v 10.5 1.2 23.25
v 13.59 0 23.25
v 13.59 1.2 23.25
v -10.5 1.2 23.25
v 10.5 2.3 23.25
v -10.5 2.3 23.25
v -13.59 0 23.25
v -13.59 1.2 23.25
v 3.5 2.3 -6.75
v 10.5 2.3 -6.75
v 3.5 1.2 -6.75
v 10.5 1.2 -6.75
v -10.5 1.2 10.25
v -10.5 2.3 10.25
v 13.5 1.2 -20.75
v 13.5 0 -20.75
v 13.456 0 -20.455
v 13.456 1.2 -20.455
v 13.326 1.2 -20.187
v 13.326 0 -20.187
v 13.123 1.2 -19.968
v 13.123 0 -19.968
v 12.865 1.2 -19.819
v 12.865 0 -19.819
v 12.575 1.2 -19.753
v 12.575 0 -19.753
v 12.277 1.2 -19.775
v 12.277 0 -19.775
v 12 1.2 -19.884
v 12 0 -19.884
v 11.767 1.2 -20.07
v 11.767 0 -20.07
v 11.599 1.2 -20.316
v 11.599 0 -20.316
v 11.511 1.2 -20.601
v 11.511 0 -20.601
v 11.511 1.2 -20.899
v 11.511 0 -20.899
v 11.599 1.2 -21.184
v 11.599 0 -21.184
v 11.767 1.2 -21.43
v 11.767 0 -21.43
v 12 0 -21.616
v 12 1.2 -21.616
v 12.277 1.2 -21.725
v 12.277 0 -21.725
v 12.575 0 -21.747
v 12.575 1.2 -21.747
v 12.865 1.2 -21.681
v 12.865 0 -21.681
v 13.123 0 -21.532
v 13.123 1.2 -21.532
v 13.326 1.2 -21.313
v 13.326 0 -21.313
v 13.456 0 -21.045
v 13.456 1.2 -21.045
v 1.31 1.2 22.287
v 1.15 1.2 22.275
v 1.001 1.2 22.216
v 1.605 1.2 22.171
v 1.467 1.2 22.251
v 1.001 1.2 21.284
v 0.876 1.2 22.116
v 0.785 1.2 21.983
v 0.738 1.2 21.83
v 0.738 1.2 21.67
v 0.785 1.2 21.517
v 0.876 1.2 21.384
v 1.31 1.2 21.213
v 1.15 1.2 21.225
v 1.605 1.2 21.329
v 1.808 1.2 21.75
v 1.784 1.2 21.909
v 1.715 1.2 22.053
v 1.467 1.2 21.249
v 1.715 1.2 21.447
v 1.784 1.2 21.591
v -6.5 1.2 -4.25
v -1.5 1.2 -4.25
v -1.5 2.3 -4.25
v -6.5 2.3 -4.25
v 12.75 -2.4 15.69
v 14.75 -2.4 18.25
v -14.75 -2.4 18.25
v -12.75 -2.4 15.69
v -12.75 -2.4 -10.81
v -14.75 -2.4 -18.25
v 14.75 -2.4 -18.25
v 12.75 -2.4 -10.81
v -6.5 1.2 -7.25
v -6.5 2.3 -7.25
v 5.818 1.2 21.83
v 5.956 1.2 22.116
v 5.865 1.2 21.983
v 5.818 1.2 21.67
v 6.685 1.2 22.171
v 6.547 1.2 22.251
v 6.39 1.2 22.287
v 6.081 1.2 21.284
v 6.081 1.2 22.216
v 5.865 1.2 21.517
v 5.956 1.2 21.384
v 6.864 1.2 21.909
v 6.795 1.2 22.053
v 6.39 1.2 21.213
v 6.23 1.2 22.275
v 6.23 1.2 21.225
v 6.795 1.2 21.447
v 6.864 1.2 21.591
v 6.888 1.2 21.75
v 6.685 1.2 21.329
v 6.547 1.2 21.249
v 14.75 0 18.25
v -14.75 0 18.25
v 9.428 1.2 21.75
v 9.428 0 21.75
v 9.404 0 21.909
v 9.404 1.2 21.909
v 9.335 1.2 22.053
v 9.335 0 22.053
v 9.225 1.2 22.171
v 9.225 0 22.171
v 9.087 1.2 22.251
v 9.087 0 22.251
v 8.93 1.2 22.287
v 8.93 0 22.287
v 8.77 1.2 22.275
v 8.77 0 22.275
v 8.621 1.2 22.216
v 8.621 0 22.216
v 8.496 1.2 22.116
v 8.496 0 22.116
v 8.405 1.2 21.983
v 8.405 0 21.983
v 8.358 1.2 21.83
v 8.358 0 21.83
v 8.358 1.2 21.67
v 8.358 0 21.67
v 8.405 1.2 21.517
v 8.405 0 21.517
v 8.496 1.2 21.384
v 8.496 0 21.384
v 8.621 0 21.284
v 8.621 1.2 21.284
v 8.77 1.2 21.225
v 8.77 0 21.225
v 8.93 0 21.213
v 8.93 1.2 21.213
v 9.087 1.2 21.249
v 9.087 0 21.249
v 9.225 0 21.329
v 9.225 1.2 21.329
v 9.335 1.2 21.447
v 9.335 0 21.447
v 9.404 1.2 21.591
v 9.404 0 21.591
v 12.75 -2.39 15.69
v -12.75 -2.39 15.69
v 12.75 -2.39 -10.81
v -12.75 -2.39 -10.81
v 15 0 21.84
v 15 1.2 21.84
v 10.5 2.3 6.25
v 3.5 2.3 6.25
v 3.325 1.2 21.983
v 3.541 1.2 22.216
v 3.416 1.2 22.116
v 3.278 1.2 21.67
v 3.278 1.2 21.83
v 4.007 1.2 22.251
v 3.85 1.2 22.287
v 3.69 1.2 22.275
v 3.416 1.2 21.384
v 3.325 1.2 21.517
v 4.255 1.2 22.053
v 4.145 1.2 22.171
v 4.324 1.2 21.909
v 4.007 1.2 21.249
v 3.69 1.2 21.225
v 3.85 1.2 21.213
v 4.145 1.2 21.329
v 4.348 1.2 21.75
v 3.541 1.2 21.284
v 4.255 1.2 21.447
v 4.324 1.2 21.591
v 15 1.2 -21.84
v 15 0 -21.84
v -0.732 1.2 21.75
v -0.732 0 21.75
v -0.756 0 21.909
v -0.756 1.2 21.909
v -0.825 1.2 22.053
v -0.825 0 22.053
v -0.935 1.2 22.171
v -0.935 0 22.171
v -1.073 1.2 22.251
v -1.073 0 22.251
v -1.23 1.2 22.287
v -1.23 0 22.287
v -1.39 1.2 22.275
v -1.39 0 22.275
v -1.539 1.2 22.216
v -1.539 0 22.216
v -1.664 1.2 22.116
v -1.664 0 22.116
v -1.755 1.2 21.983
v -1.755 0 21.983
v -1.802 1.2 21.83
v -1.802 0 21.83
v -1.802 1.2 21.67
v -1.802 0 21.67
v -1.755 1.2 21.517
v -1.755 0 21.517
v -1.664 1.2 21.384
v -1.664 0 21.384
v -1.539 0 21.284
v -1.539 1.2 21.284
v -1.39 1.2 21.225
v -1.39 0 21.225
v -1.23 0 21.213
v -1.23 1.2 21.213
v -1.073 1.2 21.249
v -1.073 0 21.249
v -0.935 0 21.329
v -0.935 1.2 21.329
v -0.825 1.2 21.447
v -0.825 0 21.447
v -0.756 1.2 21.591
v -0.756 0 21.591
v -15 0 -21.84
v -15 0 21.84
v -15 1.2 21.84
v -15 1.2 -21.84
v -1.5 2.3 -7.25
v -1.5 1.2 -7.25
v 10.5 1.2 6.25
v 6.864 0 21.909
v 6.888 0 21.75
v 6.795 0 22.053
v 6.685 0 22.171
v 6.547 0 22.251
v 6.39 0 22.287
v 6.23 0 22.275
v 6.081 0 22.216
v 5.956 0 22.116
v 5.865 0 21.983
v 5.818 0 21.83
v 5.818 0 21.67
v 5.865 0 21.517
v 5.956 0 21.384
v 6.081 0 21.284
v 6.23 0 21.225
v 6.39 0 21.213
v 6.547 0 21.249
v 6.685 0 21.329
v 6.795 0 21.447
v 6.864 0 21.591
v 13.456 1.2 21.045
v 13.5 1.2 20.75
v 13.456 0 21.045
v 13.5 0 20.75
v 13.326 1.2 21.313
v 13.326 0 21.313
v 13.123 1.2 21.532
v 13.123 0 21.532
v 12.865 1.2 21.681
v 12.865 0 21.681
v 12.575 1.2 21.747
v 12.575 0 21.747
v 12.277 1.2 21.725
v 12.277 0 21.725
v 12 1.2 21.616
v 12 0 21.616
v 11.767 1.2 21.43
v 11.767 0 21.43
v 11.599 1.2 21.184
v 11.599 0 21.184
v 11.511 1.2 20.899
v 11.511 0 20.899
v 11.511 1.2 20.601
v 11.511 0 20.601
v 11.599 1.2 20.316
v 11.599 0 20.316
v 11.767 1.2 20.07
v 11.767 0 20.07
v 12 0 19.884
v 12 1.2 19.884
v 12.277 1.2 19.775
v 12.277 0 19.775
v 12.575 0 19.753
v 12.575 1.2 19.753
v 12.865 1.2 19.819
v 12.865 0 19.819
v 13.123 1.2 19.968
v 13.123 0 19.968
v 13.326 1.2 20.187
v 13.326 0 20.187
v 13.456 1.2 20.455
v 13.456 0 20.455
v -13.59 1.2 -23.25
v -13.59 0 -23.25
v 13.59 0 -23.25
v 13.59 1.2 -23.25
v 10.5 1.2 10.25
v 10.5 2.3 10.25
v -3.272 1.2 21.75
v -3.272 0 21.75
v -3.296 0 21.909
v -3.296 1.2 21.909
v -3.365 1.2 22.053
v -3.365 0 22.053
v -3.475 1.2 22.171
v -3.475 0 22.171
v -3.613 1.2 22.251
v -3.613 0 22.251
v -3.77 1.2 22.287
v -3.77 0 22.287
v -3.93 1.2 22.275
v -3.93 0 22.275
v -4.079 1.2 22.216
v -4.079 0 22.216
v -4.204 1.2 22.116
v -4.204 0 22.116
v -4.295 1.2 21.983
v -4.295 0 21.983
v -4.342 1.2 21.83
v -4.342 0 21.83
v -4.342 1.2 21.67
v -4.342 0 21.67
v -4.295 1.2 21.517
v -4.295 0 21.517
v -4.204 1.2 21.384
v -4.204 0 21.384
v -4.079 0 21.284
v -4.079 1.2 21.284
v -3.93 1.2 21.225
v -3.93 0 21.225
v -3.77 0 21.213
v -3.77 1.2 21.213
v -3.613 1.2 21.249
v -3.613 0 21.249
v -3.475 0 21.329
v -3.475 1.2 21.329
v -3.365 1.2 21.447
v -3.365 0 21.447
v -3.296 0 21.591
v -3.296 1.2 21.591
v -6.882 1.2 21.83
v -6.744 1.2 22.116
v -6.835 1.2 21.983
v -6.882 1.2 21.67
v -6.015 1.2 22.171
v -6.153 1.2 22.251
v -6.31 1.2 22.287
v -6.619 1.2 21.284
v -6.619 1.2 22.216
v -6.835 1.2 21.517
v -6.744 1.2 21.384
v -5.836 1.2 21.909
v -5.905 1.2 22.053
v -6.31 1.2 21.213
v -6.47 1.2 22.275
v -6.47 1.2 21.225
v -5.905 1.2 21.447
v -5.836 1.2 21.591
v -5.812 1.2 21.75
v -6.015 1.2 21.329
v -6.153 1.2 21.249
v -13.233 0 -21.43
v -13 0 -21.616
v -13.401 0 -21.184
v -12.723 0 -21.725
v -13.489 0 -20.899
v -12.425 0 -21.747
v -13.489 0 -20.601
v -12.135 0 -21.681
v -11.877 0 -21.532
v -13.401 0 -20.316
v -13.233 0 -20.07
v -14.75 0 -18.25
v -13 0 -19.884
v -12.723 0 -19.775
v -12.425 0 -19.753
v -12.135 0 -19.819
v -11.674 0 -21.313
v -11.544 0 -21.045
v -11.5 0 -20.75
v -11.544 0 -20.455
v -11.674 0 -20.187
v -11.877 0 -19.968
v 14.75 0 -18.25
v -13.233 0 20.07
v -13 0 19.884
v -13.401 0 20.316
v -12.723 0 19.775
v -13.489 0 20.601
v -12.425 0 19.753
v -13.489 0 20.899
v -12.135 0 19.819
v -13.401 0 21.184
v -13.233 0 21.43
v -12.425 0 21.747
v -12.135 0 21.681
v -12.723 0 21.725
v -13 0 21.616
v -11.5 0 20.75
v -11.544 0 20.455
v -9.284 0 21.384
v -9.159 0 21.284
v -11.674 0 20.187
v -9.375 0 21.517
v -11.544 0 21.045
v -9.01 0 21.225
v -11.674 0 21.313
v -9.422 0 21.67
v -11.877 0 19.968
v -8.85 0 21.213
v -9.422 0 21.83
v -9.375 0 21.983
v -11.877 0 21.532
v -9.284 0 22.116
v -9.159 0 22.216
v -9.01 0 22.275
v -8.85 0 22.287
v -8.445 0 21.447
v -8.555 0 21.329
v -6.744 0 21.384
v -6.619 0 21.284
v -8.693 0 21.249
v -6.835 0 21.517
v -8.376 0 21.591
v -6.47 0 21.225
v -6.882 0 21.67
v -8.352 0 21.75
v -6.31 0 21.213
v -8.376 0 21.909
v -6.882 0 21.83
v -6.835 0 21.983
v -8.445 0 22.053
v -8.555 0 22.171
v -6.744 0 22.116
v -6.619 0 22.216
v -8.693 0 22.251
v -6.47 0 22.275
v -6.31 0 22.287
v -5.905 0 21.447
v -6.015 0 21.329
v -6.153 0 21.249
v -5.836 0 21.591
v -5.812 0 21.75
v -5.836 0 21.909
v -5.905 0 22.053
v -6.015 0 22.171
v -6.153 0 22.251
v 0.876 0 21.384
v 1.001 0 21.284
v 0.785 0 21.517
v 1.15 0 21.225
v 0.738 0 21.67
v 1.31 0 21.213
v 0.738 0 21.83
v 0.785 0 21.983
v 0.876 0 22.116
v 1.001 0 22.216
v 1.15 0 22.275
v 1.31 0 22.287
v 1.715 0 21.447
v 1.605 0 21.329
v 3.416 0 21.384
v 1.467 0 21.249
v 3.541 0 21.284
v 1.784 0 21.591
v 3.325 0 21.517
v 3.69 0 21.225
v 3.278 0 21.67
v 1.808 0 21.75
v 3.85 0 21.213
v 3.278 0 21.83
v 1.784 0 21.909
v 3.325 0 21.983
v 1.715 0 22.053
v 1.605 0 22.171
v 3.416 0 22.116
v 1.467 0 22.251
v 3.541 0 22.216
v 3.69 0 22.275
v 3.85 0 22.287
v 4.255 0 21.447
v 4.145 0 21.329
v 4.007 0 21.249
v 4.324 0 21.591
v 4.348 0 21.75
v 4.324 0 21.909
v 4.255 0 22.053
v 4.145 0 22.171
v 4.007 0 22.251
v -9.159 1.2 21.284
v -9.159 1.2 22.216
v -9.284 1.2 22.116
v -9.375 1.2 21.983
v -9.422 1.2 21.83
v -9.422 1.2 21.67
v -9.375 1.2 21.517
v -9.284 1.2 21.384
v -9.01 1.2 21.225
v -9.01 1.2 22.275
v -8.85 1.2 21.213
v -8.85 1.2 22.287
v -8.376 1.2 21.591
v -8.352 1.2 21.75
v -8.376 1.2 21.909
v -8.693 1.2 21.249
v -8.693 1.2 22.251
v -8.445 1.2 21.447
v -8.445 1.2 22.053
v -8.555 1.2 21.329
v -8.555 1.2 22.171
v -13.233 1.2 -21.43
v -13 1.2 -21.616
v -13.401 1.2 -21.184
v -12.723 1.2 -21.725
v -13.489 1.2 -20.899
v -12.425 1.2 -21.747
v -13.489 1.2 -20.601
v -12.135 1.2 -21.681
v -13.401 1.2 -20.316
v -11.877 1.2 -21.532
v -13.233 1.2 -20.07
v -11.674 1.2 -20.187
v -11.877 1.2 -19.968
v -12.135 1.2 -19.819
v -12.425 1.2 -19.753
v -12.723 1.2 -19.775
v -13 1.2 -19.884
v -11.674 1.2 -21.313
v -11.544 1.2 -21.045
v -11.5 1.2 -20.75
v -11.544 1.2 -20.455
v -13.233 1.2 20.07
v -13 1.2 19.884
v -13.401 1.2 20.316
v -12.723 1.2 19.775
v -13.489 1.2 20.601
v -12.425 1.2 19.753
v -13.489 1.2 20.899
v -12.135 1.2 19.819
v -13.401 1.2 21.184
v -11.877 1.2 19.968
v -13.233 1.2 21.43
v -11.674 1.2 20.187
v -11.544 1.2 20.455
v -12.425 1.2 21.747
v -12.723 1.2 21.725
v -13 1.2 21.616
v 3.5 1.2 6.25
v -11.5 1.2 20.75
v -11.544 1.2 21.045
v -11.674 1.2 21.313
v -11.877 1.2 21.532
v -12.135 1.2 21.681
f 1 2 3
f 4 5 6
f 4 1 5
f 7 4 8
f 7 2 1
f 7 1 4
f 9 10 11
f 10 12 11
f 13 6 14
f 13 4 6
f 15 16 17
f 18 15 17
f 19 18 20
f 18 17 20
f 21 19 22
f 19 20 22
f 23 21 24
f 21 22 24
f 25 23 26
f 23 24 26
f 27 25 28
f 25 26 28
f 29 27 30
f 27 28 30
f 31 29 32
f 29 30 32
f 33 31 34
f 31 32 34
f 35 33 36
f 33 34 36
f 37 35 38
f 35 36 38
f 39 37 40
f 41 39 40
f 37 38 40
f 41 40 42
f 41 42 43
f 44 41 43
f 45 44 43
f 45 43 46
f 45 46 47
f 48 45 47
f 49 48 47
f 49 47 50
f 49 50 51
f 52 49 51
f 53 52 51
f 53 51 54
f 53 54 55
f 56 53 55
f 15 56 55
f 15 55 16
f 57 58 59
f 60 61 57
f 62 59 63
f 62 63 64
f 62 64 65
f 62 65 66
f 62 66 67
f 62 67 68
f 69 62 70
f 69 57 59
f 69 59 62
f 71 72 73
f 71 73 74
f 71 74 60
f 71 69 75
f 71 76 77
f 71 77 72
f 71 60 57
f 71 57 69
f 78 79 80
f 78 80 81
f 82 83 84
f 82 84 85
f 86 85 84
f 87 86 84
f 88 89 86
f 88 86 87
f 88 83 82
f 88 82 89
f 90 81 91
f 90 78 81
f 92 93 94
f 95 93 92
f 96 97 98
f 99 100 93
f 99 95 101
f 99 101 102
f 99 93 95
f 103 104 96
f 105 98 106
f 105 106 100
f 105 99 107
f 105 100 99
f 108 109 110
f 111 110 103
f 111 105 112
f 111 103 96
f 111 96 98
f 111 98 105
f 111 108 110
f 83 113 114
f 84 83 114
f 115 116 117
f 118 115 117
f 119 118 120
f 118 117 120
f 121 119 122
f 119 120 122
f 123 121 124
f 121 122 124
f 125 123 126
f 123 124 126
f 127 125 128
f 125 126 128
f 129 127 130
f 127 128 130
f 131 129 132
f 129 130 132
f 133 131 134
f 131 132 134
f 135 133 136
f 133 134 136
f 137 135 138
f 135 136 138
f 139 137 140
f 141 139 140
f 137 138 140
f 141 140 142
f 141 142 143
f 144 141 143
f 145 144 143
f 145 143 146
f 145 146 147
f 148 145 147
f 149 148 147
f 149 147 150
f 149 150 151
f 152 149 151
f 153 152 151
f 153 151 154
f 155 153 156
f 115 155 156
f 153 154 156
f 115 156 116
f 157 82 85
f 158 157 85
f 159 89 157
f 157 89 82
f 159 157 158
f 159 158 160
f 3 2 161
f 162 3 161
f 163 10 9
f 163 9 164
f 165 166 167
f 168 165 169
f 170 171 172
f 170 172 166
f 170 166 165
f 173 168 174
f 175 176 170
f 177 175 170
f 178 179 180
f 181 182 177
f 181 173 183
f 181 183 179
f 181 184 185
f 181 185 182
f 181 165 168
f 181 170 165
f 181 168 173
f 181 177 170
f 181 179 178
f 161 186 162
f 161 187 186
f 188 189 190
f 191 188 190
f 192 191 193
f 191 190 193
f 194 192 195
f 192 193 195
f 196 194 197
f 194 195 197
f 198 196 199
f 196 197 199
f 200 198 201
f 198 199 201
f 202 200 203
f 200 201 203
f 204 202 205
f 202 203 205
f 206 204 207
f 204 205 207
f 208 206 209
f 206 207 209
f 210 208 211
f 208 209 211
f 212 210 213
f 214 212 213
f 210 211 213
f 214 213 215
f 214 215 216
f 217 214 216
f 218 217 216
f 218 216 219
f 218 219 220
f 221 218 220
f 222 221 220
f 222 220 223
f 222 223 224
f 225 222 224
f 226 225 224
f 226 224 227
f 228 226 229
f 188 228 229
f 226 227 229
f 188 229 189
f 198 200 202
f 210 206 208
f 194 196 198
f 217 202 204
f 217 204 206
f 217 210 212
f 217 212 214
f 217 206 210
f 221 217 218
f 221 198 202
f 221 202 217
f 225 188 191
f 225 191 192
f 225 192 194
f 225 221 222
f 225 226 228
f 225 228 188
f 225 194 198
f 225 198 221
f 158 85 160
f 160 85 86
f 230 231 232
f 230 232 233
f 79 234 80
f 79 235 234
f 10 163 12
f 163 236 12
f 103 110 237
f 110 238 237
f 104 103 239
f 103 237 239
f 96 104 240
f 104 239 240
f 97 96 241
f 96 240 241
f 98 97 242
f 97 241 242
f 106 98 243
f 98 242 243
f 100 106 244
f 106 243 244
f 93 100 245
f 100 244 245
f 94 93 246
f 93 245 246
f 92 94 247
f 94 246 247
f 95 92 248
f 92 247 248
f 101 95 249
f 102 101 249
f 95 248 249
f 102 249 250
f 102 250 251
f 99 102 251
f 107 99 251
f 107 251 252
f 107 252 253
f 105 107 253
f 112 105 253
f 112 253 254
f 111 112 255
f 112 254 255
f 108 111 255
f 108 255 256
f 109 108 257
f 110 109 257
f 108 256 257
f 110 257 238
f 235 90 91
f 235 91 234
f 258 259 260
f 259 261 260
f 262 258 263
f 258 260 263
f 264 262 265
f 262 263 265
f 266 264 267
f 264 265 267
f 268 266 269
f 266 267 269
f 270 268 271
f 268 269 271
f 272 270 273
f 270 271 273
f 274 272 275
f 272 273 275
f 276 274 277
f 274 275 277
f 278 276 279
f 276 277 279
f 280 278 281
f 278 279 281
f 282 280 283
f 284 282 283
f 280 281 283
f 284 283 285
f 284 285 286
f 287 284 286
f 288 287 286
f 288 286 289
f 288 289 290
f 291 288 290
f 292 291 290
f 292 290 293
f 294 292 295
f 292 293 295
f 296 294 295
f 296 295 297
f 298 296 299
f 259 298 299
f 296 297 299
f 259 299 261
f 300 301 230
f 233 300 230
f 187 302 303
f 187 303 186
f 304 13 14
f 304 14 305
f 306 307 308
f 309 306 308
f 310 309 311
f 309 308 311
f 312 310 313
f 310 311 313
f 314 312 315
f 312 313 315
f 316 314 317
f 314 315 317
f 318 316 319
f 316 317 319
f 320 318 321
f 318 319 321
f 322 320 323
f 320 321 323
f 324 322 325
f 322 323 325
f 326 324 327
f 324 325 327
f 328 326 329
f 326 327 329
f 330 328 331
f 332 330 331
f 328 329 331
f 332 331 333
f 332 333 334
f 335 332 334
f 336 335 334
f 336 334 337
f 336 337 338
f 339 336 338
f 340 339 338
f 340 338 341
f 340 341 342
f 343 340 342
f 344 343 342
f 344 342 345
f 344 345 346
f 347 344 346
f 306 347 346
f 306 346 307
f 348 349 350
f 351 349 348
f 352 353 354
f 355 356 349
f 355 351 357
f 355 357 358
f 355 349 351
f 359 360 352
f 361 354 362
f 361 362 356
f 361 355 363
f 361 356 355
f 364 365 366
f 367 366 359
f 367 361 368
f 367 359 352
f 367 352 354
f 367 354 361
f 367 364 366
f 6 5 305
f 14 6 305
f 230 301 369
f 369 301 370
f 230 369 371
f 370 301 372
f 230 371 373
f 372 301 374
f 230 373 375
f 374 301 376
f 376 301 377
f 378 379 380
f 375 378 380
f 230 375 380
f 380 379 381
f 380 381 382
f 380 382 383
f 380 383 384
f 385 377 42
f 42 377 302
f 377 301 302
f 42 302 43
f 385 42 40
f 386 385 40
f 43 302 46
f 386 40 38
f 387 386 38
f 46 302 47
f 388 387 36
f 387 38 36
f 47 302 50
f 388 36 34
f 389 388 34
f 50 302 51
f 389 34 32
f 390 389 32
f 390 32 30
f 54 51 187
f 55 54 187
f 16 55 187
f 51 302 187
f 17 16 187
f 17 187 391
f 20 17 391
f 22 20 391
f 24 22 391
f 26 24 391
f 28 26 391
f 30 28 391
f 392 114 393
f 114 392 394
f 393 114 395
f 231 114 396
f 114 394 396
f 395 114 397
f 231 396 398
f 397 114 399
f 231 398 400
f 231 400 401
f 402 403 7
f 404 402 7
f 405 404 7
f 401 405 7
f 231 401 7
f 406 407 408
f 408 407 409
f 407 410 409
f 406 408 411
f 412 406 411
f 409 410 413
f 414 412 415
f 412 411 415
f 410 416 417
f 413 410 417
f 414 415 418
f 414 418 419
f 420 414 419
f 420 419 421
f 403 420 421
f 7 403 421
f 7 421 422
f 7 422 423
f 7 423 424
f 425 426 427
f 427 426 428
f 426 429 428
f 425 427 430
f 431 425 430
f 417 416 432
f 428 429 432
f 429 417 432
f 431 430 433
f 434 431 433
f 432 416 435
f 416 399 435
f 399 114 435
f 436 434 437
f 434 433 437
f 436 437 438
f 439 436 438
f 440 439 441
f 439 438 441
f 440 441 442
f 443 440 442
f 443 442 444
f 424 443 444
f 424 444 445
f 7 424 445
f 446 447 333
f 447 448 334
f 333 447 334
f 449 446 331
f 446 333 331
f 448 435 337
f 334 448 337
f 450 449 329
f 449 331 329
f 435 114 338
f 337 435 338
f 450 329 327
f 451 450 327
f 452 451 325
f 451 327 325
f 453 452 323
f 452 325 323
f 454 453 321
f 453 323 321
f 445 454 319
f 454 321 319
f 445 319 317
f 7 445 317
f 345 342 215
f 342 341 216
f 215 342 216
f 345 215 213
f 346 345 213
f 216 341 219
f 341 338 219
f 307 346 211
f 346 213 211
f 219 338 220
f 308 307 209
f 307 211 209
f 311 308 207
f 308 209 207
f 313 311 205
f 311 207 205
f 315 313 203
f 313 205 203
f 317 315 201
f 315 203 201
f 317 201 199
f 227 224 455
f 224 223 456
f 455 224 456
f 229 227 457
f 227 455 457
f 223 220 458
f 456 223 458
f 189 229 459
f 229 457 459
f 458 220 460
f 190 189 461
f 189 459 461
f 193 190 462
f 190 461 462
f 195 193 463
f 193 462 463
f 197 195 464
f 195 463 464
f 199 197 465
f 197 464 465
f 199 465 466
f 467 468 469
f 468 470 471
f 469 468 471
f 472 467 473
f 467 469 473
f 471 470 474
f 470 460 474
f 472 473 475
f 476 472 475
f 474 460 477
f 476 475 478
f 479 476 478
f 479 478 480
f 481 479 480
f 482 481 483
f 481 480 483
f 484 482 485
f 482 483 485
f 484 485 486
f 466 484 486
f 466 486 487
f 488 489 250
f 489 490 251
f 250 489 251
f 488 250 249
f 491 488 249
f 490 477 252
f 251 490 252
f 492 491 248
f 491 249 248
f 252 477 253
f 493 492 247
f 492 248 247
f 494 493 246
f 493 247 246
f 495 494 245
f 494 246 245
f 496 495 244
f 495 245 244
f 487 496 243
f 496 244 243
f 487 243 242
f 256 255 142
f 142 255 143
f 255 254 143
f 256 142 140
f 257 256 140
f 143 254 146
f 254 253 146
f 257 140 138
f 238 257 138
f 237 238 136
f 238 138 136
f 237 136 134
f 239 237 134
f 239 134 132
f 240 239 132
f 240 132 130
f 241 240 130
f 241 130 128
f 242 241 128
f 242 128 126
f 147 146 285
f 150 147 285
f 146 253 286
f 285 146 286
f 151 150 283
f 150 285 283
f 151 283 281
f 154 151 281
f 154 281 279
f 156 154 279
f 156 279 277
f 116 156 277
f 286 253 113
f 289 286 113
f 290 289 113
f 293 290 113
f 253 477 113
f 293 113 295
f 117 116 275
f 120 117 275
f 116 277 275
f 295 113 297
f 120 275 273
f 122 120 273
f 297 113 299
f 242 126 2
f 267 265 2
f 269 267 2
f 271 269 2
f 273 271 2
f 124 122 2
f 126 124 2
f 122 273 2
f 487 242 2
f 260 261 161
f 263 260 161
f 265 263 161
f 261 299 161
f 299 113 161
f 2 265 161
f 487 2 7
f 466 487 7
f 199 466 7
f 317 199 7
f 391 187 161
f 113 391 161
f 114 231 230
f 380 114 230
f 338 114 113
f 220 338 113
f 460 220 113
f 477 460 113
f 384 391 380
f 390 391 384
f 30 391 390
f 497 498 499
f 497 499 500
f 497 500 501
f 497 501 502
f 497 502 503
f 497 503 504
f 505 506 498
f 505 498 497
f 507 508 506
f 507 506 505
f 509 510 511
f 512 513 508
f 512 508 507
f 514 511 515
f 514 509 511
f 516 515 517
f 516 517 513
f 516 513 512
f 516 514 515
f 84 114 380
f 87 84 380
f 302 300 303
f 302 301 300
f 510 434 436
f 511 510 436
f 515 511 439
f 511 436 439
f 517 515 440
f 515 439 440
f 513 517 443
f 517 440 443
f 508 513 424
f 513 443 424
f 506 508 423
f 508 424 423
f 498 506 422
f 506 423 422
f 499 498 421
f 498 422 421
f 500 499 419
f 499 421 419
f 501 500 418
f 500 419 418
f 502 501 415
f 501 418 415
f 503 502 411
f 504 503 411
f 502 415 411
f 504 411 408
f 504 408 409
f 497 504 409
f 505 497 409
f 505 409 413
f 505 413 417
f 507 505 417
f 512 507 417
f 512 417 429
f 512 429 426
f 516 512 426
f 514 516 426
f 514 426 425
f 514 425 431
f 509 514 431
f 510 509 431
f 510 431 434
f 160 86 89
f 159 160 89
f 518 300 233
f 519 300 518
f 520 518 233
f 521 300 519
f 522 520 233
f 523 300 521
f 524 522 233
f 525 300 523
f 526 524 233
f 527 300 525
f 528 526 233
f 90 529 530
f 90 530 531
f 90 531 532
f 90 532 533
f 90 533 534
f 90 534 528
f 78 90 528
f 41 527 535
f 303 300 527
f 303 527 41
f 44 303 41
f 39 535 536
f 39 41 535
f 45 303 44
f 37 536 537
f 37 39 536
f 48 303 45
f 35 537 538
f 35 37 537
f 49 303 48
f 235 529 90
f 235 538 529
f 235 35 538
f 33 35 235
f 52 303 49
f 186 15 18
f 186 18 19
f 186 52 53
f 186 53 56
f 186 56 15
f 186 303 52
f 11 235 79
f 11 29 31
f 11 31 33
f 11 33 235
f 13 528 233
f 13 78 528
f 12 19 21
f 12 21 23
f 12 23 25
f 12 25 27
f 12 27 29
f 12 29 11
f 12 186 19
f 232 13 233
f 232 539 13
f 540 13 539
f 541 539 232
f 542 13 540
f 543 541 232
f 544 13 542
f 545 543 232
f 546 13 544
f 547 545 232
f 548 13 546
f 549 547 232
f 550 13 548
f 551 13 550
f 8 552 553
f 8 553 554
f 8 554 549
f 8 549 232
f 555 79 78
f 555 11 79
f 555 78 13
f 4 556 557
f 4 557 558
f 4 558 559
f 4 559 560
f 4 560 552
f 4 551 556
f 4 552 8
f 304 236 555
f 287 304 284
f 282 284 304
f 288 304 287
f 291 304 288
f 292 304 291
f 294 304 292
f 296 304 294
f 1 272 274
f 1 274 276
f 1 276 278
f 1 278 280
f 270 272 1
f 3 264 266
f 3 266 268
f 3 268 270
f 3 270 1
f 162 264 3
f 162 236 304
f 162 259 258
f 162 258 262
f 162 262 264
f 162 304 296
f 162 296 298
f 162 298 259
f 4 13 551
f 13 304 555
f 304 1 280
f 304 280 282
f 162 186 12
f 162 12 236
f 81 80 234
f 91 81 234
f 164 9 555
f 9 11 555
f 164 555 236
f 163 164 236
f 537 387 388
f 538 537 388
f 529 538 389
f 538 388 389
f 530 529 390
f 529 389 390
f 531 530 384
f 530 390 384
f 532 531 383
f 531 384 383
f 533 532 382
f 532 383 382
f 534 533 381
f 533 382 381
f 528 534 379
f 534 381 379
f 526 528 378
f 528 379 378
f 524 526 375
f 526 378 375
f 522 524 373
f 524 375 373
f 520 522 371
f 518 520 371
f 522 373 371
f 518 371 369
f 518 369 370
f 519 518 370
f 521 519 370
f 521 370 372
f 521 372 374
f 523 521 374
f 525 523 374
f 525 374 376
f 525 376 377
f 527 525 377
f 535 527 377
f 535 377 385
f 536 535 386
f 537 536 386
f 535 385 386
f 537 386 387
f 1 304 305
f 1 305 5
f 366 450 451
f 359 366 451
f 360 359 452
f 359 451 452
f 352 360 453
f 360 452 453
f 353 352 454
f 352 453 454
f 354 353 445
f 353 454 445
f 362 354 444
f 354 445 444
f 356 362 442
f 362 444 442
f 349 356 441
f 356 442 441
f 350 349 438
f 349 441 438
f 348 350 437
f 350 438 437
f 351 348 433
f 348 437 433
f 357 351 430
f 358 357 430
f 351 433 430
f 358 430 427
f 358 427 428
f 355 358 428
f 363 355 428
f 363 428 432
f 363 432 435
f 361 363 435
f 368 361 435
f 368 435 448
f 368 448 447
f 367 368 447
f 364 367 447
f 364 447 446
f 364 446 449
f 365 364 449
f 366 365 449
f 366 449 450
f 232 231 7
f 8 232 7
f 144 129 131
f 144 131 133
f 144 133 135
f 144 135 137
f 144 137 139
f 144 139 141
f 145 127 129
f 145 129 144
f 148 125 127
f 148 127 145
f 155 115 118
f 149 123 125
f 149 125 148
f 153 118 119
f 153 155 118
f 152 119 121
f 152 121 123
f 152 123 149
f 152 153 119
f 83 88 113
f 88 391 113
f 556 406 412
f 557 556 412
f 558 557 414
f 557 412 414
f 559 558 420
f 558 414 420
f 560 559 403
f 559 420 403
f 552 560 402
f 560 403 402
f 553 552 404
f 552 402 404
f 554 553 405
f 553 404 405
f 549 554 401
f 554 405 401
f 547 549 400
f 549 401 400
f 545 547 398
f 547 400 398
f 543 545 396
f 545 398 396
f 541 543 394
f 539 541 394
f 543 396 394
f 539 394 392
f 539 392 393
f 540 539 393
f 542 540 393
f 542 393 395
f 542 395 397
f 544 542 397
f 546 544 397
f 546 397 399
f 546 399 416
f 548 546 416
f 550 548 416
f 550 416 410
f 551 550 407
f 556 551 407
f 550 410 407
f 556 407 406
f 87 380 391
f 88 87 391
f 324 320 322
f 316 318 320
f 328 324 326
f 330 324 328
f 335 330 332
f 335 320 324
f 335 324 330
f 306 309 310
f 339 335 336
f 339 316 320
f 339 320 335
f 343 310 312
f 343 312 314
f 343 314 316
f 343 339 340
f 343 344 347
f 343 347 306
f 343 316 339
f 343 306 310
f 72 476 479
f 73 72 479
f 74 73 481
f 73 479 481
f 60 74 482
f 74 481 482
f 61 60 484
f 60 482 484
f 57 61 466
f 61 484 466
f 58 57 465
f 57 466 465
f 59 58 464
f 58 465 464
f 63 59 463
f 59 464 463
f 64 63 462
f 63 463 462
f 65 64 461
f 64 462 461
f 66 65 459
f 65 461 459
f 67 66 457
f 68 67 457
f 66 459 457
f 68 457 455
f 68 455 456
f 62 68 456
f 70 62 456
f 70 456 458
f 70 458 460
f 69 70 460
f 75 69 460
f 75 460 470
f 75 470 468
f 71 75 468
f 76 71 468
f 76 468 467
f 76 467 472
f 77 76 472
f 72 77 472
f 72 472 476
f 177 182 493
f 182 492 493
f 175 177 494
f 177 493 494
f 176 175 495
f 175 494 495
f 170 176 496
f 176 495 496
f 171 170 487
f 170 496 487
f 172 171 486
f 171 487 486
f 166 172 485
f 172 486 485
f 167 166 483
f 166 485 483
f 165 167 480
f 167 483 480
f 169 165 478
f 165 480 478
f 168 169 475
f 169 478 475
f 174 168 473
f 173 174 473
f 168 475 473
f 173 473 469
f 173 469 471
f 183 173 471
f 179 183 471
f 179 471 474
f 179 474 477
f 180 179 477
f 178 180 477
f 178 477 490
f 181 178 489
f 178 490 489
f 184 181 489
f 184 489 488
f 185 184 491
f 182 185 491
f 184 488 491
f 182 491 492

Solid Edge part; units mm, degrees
sketch "Sketch1" plane through (0, 0, 0) normal (0, -1, 0) x (1, 0, 0)
  line L0 (-13.59, -23.25) -> (-15, -21.84)
  line L1 (-15, 21.84) -> (-15, -21.84)
  line L2 (-15, 21.84) -> (-13.59, 23.25)
  line L3 (13.59, 23.25) -> (-13.59, 23.25)
  line L4 (13.59, 23.25) -> (15, 21.84)
  line L5 (15, -21.84) -> (15, 21.84)
  line L6 (13.59, -23.25) -> (15, -21.84)
  line L7 (-13.59, -23.25) -> (13.59, -23.25)
extrude "Protrusion1" add sketch "Sketch1" against normal blind 1.2
sketch "Sketch2" plane through (0, 0, 0) normal (0, -1, 0) x (1, 0, 0)
  line L0 (14.75, 18.25) -> (-14.75, 18.25)
  line L1 (-14.75, 18.25) -> (-14.75, -18.25)
  line L2 (-14.75, -18.25) -> (14.75, -18.25)
  line L3 (14.75, -18.25) -> (14.75, 18.25)
extrude "ExtrudedProtrusion_2" add sketch "Sketch2" along normal blind 2.4
sketch "Sketch3" plane through (0, 0, 0) normal (0, -1, 0) x (1, 0, 0)
  circle A0 centre (-12.5, 20.75) radius 1
  circle A1 centre (12.5, 20.75) radius 1
  circle A2 centre (12.5, -20.75) radius 1
  circle A3 centre (-12.5, -20.75) radius 1
  dimension "D1" = 2
  dimension "D2" = 41.5
  dimension "D3" = 25
  dimension "D4" = 2.5
  dimension "D5" = 2.5
extrude "Cutout1" cut sketch "Sketch3" against normal up to next
sketch "Sketch4" plane through (0, -2.4, 0) normal (0, -1, 0) x (1, 0, 0)
  line L0 (12.75, 15.69) -> (-12.75, 15.69)
  line L1 (-12.75, 15.69) -> (-12.75, -10.81)
  line L2 (-12.75, -10.81) -> (12.75, -10.81)
  line L3 (12.75, -10.81) -> (12.75, 15.69)
extrude "ExtrudedCutout_2" cut sketch "Sketch4" against normal blind 0.01
sketch "Sketch5" plane through (0, 0, 0) normal (0, -1, 0) x (1, 0, 0)
  circle A0 centre (-8.89, 21.75) radius 0.5381
  circle A1 centre (-6.35, 21.75) radius 0.5381
  circle A2 centre (-3.81, 21.75) radius 0.5381
  circle A3 centre (-1.27, 21.75) radius 0.5381
  circle A4 centre (1.27, 21.75) radius 0.5381
  circle A5 centre (3.81, 21.75) radius 0.5381
  circle A6 centre (6.35, 21.75) radius 0.5381
  circle A7 centre (8.89, 21.75) radius 0.5381
  dimension "D1" = 2.54
  dimension "D2" = 6.11
  dimension "D3" = 1.5
extrude "Cutout2" cut sketch "Sketch5" against normal through all
sketch "Sketch6" plane through (0, 1.2, 0) normal (0, 1, 0) x (0, 0, 1)
  line L0 (10.25, -10.5) -> (10.25, 10.5)
  line L1 (10.25, 10.5) -> (23.25, 10.5)
  line L2 (23.25, 10.5) -> (23.25, 7.6087)
  line L3 (23.25, 7.6087) -> (23.25, -7.6326)
  line L4 (23.25, -7.6326) -> (23.25, -10.5)
  line L5 (23.25, -10.5) -> (10.25, -10.5)
  line L6 (-6.75, 3.5) -> (6.25, 3.5)
  line L7 (6.25, 3.5) -> (6.25, 10.5)
  line L8 (6.25, 10.5) -> (-6.75, 10.5)
  line L9 (-6.75, 10.5) -> (-6.75, 3.5)
  line L10 (-7.25, -1.5) -> (-4.25, -1.5)
  line L11 (-4.25, -1.5) -> (-4.25, -6.5)
  line L12 (-4.25, -6.5) -> (-7.25, -6.5)
  line L13 (-7.25, -6.5) -> (-7.25, -1.5)
  dimension "D1" = 2
  dimension "D2" = 4
  dimension "D3" = 6
  dimension "D4" = 12
  dimension "D5" = 5
  dimension "D6" = 17
  dimension "D7" = 29
  dimension "D8" = 11
  dimension "D9" = 9
  dimension "D10" = 16.5
  dimension "D11" = 0.5
  dimension "D12" = 0.5
  dimension "D13" = 13
  dimension "D14" = 4.5
  dimension "D15" = 4.5
extrude "ExtrudedProtrusion_6" add sketch "Sketch6" along normal blind 1.1
properties material "Polycarbonate"
